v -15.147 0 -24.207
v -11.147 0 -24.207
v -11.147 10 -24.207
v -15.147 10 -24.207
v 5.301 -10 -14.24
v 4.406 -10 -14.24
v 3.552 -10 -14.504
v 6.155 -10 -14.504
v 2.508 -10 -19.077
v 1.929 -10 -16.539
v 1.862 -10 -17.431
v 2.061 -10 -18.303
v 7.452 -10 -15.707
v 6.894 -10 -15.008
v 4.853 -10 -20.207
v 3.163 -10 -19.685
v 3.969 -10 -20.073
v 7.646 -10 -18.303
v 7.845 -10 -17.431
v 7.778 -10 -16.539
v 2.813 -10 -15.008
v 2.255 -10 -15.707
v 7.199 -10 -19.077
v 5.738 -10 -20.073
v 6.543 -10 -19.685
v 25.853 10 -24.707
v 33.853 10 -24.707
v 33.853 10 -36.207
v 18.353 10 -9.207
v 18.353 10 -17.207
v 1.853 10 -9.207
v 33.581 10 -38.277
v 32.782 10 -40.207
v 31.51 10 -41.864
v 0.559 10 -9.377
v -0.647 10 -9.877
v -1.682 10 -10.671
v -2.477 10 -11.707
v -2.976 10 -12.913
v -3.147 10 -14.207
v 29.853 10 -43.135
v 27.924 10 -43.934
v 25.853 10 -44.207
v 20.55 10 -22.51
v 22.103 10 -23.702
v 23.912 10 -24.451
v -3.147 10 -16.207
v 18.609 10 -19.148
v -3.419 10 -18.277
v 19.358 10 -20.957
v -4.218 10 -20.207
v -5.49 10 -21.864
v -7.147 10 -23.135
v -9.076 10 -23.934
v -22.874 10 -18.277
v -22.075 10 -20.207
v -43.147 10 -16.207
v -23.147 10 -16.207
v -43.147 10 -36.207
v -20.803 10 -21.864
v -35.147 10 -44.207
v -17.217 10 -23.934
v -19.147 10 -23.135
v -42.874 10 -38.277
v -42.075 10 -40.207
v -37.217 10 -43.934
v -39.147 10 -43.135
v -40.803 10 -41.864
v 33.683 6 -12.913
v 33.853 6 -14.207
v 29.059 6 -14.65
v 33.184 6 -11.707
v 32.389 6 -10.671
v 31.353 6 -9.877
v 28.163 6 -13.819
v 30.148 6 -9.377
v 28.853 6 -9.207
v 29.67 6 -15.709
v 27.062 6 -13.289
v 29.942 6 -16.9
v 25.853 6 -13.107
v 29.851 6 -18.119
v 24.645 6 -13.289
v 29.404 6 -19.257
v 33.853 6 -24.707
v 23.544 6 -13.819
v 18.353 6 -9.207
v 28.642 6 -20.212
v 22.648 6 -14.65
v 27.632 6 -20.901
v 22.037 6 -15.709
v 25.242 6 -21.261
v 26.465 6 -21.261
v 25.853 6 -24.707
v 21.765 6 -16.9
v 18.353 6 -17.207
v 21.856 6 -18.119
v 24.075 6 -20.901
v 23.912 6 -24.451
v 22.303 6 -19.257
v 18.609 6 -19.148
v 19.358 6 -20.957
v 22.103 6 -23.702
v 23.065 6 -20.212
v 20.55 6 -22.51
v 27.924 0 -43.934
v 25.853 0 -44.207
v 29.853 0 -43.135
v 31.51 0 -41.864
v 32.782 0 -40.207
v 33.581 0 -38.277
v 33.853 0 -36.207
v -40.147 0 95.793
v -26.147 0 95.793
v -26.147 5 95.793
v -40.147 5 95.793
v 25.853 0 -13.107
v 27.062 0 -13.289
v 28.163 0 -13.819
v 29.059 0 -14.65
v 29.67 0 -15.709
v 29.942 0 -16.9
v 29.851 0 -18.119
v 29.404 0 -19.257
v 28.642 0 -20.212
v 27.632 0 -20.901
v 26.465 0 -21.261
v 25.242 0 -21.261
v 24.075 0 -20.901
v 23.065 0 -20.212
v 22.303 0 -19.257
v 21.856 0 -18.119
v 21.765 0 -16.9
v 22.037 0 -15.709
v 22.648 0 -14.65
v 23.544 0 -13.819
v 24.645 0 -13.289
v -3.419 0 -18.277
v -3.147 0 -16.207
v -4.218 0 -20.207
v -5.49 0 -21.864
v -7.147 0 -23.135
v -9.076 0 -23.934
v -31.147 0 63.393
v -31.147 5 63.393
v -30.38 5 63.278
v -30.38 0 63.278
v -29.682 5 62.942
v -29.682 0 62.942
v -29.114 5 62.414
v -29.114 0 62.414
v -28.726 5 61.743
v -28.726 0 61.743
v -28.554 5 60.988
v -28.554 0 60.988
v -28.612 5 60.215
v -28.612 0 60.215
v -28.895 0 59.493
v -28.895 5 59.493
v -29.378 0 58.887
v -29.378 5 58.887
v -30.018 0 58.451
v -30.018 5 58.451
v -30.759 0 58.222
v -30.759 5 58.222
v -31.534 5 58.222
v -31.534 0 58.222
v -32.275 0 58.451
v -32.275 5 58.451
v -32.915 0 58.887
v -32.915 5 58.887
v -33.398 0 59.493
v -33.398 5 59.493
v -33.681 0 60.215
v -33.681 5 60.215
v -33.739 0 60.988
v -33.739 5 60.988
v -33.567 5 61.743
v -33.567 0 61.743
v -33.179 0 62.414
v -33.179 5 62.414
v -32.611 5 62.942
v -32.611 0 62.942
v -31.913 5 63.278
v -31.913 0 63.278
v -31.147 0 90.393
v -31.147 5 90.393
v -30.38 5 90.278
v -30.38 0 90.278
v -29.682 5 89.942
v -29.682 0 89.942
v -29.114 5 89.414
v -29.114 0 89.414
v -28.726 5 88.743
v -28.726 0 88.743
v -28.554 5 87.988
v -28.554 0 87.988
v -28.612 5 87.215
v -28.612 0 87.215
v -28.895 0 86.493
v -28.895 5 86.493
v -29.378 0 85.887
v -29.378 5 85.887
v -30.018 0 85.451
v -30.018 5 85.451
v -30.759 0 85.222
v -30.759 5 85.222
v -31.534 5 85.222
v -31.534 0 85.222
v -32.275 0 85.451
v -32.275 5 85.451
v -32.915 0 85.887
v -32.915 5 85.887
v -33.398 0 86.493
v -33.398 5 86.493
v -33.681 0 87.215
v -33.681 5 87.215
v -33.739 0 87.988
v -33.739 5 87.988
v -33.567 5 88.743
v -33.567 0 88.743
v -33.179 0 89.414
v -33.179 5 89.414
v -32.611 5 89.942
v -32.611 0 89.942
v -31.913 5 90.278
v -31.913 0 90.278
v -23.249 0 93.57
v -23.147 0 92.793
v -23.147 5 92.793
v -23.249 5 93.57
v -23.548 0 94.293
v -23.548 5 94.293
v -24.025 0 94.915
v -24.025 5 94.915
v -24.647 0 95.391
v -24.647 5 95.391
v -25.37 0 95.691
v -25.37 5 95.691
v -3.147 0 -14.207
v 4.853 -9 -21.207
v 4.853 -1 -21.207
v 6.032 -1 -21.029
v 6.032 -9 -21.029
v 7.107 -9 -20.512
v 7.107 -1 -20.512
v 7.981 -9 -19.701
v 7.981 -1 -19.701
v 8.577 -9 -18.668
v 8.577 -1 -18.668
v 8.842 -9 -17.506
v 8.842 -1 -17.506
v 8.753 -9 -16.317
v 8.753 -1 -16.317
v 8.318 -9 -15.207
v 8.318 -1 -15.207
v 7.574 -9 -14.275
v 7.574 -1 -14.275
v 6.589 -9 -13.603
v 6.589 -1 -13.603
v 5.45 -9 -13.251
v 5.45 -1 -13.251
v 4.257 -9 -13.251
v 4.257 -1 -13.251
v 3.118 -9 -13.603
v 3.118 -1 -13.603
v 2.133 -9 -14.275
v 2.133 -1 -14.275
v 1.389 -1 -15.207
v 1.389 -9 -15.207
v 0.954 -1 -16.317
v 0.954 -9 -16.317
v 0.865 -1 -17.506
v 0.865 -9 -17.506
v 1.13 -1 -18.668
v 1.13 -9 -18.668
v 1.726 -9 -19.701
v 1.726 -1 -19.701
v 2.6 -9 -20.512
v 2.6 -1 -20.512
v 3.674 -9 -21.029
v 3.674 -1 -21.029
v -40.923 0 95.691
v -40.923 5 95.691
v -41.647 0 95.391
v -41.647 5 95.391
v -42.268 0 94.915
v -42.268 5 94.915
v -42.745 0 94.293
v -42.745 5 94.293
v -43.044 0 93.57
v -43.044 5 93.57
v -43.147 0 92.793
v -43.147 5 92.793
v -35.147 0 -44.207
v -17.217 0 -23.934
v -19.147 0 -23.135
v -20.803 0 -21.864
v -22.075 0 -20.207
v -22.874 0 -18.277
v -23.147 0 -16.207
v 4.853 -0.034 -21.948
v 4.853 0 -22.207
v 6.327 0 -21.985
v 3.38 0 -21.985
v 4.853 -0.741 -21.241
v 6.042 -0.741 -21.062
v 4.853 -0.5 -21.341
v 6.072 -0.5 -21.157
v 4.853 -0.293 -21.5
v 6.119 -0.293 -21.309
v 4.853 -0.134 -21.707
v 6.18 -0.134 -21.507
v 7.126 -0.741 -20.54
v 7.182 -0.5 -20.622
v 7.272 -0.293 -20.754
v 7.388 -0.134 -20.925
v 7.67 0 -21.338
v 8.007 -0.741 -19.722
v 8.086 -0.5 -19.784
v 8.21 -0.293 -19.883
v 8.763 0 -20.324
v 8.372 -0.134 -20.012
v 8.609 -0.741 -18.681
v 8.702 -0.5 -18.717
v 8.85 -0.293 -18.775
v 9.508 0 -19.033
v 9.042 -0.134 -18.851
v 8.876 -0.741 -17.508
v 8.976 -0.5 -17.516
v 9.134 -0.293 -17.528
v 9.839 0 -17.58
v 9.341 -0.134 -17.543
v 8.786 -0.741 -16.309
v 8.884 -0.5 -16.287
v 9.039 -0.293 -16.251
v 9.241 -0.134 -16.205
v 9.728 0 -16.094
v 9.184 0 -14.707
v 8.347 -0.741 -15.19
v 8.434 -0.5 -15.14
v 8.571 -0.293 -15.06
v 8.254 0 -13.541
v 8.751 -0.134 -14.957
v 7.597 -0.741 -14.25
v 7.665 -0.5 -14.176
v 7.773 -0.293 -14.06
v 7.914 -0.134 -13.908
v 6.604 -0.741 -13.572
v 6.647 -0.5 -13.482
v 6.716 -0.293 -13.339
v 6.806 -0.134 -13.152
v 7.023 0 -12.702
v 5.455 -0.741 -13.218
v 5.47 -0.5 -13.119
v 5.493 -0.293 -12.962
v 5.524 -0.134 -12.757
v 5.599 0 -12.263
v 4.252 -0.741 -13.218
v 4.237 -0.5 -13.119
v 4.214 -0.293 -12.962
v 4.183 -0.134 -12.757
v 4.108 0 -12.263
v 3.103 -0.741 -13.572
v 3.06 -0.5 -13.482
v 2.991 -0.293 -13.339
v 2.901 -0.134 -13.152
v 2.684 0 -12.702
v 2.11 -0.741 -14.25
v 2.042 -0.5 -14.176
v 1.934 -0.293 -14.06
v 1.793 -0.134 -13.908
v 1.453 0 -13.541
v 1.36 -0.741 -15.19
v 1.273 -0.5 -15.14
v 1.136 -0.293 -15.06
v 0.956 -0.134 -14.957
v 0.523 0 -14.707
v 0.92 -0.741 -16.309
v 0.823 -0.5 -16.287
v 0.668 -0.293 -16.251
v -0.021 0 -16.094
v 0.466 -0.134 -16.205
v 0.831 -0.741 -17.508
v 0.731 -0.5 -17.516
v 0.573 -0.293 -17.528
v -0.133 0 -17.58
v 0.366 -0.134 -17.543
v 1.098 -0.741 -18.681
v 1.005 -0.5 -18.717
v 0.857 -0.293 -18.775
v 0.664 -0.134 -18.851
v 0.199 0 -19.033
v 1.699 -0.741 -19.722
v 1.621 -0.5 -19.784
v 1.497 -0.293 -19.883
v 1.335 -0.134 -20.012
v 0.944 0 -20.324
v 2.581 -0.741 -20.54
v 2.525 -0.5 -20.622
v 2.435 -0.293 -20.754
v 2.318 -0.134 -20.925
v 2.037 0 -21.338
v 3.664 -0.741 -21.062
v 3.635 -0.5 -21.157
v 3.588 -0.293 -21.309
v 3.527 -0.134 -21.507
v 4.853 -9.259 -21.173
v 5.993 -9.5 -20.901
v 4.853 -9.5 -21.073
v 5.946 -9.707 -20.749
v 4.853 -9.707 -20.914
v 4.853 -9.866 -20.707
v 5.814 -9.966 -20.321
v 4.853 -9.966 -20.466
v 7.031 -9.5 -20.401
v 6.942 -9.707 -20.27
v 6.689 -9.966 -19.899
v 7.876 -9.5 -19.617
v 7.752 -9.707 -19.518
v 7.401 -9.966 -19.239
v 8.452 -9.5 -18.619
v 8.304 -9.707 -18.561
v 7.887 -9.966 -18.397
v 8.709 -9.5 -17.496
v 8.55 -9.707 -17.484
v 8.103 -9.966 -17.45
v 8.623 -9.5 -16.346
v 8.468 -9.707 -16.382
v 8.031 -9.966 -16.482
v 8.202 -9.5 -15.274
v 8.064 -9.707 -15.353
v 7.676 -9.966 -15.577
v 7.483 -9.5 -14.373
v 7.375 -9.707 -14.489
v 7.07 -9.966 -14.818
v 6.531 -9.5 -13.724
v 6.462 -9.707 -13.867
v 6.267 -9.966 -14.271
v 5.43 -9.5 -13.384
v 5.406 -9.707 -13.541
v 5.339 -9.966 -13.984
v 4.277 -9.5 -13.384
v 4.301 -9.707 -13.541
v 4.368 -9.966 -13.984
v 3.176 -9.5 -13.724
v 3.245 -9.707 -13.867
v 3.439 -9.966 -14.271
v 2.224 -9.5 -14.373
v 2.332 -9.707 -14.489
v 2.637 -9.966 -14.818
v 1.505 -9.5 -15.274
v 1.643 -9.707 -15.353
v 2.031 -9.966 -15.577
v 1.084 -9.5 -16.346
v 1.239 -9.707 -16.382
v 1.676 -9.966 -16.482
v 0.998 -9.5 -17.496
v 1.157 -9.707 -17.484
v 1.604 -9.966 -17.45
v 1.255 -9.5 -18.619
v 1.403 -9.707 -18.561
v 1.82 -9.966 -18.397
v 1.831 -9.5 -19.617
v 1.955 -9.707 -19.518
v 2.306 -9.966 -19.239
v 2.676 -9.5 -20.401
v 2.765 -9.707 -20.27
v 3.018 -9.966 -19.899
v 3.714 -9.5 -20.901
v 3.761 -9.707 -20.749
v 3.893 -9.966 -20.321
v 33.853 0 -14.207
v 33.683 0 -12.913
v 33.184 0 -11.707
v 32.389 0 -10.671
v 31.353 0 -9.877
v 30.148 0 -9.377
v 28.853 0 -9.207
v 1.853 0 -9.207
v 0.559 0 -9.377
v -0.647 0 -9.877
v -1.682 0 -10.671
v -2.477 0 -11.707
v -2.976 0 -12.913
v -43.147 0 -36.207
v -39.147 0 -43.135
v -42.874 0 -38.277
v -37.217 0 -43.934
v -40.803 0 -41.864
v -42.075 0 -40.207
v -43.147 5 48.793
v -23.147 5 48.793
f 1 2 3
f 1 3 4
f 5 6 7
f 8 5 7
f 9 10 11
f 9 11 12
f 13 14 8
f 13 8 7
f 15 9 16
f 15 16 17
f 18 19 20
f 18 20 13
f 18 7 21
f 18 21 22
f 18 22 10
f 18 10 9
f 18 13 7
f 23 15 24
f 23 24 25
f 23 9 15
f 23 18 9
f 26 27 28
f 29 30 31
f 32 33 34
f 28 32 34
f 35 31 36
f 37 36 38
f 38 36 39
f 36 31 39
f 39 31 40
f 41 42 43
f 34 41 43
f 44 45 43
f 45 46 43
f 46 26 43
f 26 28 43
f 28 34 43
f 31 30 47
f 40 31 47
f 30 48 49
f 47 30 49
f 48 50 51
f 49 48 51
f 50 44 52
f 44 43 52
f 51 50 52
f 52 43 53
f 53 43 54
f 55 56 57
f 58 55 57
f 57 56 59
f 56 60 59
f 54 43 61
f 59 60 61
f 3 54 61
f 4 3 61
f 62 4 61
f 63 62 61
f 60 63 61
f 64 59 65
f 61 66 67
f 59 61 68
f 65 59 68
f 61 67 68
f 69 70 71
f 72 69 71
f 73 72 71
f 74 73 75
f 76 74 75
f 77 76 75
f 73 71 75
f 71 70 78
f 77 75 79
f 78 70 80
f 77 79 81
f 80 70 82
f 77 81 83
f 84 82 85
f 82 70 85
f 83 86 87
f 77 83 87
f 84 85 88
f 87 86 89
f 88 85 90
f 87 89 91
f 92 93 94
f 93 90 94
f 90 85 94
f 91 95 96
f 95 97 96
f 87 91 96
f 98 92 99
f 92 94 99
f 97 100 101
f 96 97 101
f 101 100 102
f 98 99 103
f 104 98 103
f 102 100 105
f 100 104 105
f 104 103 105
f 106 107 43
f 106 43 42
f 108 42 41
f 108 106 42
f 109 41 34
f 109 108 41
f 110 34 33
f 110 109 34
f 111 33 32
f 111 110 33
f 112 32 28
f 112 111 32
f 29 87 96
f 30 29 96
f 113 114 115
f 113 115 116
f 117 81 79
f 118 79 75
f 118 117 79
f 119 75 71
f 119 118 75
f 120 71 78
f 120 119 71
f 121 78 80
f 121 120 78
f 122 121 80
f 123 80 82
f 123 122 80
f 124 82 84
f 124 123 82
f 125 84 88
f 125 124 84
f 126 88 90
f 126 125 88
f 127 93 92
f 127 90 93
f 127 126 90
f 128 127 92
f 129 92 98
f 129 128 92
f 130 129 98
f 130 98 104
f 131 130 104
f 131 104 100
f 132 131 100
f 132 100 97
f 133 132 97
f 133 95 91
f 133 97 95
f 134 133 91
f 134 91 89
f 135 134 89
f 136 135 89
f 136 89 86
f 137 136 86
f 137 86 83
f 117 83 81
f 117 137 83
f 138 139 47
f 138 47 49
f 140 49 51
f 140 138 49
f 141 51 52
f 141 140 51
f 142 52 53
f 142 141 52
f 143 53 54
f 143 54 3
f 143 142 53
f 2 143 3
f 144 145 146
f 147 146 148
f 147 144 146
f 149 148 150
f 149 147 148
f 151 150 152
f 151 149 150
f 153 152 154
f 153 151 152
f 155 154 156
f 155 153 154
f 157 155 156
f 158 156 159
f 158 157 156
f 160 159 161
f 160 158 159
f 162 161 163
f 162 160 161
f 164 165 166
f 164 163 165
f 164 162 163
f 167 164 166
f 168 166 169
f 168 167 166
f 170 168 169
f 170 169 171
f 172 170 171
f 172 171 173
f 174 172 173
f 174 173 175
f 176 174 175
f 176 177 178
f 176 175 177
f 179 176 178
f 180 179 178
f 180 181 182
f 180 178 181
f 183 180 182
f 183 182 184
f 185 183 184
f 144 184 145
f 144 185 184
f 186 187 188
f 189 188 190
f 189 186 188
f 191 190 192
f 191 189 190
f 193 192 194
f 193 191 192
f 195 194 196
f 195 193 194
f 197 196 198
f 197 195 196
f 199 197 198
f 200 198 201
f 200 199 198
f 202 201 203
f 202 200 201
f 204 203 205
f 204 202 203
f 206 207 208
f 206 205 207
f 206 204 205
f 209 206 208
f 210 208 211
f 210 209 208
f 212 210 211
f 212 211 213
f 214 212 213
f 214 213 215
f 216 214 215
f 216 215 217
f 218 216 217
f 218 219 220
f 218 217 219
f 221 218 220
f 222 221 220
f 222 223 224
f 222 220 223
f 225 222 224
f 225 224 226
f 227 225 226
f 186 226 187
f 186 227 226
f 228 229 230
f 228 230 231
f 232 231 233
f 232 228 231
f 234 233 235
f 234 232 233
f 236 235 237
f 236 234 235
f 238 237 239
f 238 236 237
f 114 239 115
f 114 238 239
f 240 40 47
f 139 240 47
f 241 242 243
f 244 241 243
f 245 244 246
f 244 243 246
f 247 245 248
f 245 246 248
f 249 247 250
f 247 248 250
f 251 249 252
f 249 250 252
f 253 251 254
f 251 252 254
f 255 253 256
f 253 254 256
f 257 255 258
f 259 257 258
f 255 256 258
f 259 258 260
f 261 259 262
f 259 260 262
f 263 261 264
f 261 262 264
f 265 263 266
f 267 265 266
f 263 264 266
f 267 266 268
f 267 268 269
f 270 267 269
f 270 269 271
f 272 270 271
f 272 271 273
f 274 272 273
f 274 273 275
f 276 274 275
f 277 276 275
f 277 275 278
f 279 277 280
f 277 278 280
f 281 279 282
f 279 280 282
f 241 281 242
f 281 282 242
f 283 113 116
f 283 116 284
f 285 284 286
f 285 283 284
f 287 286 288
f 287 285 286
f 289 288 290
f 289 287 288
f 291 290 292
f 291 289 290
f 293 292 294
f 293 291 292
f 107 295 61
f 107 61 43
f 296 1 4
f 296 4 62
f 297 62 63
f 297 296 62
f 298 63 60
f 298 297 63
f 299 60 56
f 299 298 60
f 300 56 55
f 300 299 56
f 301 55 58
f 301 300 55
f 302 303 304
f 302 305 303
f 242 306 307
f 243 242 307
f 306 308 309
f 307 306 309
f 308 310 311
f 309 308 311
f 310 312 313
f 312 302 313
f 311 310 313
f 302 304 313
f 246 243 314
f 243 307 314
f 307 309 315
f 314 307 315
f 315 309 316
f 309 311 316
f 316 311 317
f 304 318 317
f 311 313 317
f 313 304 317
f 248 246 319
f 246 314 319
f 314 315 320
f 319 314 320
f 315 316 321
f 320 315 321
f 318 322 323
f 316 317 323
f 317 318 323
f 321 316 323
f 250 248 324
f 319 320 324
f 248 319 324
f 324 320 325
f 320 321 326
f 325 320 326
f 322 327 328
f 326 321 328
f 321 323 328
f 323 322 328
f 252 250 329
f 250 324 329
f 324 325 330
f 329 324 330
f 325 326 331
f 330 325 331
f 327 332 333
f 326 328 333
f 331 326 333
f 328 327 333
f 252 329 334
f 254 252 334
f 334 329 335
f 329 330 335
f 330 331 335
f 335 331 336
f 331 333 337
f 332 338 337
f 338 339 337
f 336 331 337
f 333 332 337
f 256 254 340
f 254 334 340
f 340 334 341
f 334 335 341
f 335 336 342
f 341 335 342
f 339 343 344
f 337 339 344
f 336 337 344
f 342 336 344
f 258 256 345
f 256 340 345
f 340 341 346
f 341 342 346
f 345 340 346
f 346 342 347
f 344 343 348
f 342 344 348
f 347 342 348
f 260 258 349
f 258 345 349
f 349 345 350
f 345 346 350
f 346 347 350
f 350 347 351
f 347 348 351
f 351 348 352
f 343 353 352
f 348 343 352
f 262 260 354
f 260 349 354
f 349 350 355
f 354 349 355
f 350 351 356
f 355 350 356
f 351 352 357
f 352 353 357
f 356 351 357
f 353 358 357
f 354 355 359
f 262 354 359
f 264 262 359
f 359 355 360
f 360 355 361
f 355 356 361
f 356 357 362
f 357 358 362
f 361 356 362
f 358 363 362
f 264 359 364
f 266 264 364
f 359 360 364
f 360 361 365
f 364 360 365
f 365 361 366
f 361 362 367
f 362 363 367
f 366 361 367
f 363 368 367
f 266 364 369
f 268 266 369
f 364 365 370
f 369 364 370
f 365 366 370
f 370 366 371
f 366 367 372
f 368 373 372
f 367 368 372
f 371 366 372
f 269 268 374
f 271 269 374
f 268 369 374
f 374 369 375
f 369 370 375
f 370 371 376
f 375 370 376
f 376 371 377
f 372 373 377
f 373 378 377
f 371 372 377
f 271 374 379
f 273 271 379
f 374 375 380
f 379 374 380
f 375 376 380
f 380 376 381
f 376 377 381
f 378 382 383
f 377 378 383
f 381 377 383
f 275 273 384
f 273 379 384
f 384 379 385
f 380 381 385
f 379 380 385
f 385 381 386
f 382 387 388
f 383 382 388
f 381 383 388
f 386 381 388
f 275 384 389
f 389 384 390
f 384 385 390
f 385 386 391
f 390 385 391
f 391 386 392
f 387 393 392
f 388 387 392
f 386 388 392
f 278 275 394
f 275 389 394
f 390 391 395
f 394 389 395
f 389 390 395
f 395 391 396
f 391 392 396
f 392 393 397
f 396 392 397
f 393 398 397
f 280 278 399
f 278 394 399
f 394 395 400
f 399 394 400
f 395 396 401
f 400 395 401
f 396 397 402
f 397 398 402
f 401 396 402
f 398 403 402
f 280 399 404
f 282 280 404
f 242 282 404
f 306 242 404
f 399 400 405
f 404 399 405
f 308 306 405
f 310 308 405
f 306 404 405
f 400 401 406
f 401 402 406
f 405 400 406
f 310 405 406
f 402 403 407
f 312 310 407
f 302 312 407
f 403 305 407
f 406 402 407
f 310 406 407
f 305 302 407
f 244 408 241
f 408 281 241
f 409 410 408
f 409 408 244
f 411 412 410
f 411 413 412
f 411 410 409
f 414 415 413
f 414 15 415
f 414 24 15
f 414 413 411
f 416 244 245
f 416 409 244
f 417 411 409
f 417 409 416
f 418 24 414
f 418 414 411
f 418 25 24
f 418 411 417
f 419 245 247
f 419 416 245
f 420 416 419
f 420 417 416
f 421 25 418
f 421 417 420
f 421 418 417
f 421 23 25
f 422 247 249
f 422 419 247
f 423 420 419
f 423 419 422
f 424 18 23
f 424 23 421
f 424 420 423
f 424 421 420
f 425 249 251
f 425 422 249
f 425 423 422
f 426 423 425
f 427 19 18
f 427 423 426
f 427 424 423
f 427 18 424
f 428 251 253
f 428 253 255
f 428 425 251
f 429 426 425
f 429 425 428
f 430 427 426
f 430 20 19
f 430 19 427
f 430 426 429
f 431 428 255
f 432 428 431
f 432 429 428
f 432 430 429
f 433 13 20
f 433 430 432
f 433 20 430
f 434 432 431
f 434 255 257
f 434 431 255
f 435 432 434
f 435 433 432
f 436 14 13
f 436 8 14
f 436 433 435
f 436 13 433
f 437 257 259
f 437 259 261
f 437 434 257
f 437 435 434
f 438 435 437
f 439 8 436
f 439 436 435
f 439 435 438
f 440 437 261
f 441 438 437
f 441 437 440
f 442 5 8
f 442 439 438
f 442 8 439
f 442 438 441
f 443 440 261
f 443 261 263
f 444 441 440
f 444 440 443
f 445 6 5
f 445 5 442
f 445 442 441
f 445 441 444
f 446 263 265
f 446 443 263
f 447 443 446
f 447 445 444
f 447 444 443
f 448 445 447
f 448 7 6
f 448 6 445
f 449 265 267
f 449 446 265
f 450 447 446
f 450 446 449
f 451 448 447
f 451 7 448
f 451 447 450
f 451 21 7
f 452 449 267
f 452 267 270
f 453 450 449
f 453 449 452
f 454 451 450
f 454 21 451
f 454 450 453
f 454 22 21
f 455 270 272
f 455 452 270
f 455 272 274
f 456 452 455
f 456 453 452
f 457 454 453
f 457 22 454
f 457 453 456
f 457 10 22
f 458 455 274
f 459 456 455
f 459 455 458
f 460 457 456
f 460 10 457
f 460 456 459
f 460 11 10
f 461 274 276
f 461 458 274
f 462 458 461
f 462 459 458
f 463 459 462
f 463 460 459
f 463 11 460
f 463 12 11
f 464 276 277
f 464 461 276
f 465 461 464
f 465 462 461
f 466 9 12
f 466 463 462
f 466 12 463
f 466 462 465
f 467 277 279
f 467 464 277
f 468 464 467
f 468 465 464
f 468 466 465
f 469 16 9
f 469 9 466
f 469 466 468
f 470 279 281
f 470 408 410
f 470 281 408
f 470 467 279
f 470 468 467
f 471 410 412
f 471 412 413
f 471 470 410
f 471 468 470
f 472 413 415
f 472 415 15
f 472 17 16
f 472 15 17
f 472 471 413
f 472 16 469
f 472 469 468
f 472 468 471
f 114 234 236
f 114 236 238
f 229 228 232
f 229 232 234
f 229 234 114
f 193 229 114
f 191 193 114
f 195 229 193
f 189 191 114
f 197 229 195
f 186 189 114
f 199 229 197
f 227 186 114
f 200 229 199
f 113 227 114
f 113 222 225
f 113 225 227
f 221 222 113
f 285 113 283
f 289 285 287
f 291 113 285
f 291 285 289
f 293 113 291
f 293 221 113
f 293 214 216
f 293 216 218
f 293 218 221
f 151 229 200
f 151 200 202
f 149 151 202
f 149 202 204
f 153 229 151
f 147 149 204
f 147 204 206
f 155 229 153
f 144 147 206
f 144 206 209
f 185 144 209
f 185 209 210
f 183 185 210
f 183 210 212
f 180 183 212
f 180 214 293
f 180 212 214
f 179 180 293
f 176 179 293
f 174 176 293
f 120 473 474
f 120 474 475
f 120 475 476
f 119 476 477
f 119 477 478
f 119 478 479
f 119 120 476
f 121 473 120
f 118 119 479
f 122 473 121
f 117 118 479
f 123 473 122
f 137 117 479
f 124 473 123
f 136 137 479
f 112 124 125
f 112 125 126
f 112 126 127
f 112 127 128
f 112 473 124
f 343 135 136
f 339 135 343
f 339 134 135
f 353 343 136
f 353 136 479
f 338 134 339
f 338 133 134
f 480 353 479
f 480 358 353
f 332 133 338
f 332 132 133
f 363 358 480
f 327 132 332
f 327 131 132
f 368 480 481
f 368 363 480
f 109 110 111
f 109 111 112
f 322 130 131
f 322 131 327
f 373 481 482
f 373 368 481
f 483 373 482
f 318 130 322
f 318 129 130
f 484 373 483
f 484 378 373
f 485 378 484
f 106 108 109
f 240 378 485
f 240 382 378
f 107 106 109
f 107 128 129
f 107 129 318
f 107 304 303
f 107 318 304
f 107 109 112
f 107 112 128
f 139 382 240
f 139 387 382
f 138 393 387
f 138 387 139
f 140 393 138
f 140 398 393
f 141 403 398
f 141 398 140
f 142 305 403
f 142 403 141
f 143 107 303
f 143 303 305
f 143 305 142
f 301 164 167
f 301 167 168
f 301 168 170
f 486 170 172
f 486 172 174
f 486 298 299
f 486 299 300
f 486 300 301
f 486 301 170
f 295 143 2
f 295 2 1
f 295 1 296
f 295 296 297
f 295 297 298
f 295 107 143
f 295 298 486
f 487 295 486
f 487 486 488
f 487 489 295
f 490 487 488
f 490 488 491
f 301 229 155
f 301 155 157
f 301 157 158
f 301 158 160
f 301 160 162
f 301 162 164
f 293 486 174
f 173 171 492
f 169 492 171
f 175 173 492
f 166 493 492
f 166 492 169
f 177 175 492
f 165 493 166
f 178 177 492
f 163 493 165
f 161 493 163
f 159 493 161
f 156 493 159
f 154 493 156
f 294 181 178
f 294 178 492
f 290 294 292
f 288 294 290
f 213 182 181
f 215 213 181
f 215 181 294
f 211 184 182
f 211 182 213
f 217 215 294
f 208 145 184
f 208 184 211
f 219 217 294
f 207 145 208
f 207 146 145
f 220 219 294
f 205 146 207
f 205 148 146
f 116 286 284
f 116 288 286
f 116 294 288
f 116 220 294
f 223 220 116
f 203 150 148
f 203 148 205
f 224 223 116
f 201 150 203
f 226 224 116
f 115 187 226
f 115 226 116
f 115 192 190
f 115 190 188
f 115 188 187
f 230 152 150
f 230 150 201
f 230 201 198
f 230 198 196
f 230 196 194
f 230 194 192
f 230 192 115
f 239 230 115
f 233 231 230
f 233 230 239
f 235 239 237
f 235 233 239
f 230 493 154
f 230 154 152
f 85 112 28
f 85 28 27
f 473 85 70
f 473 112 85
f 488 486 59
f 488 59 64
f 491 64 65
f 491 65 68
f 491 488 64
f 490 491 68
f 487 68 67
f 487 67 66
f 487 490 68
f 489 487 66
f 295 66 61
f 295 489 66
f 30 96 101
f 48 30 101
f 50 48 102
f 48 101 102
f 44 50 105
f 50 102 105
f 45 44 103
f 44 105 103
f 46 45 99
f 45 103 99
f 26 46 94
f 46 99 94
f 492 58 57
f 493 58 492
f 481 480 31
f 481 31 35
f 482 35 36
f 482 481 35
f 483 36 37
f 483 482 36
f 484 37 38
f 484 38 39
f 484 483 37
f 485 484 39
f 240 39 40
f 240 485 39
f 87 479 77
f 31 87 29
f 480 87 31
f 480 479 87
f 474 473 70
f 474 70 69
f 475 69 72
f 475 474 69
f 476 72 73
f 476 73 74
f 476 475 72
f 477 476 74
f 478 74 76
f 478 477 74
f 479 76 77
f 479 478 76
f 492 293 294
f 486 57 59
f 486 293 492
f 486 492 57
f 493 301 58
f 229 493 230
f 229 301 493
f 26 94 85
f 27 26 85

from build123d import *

# Parameters (mm, degrees)
SKETCH1_R                = 4.1
SKETCH1_R_2              = 4
SKETCH1_R_3              = 2.6
BOSS_EXTRUDE1_DEPTH      = 10
CUT_EXTRUDE1_START       = -4
CUT_EXTRUDE1_DEPTH       = 4
CUT_EXTRUDE2_REACH       = 113.917
BOSS_EXTRUDE2_DEPTH      = 10
BOSS_EXTRUDE2_DEPTH_BACK = 10
SKETCH5_R                = 4
FILLET1_R                = 1


with BuildPart() as part:
    # Sketch1 → Boss-Extrude1 (new body)
    with BuildSketch(Plane(origin=(0, 0, 0), x_dir=(1, 0, 0), z_dir=(0, 1, 0))):
        with BuildLine():
            Line((28.853428594, 9.206712552), (1.853428594, 9.206712552))
            ThreePointArc((1.853428594, 9.206712552), (-1.682105312, 10.671178646), (-3.146571406, 14.206712552))
            Line((-3.146571406, 14.206712552), (-3.146571406, 16.206712552))
            ThreePointArc((-3.146571406, 16.206712552), (-5.489717157, 21.863566801), (-11.146571406, 24.206712552))
            Line((-11.146571406, 24.206712552), (-15.146571406, 24.206712552))
            ThreePointArc((-15.146571406, 24.206712552), (-20.803425656, 21.863566801), (-23.146571406, 16.206712552))
            Line((-23.146571406, 16.206712552), (-23.146571406, -92.793287448))
            ThreePointArc((-23.146571406, -92.793287448), (-24.025251062, -94.914607792), (-26.146571406, -95.793287448))
            Line((-26.146571406, -95.793287448), (-40.146571406, -95.793287448))
            ThreePointArc((-40.146571406, -95.793287448), (-42.26789175, -94.914607792), (-43.146571406, -92.793287448))
            Line((-43.146571406, -92.793287448), (-43.146571406, 4.206712552))
            Line((-43.146571406, 4.206712552), (-43.146571406, 36.206712552))
            ThreePointArc((-43.146571406, 36.206712552), (-40.803425656, 41.863566801), (-35.146571406, 44.206712552))
            Line((-35.146571406, 44.206712552), (-3.146571406, 44.206712552))
            Line((-3.146571406, 44.206712552), (25.853428594, 44.206712552))
            ThreePointArc((25.853428594, 44.206712552), (31.510282843, 41.863566801), (33.853428594, 36.206712552))
            Line((33.853428594, 36.206712552), (33.853428594, 14.206712552))
            ThreePointArc((33.853428594, 14.206712552), (32.3889625, 10.671178646), (28.853428594, 9.206712552))
        make_face()
        with Locations(Location((25.853428594, 17.206712552, 0), (0, 0, 270))):
            Circle(SKETCH1_R, mode=Mode.SUBTRACT)
        with Locations(Location((4.853428594, 17.206712552, 0), (0, 0, 270))):
            Circle(SKETCH1_R_2, mode=Mode.SUBTRACT)
        with Locations(Location((-31.146571406, -87.793287448, 0), (0, 0, 270))):
            Circle(SKETCH1_R_3, mode=Mode.SUBTRACT)
        with Locations(Location((-31.146571406, -60.793287448, 0), (0, 0, 270))):
            Circle(SKETCH1_R_3, mode=Mode.SUBTRACT)
    extrude(amount=BOSS_EXTRUDE1_DEPTH)

    # Sketch2 → Cut-Extrude1 (cut)
    with BuildSketch(Plane(origin=(0, 10, 0), x_dir=(1, 0, 0), z_dir=(0, 1, 0)).offset(CUT_EXTRUDE1_START)):
        with BuildLine():
            Line((25.853428594, 24.706712552), (33.853428594, 24.706712552))
            Line((33.853428594, 24.706712552), (33.853428594, 14.206712552))
            ThreePointArc((33.853428594, 14.206712552), (32.3889625, 10.671178646), (28.853428594, 9.206712552))
            Line((28.853428594, 9.206712552), (18.353428594, 9.206712552))
            Line((18.353428594, 9.206712552), (18.353428594, 17.206712552))
            ThreePointArc((18.353428594, 17.206712552), (20.550127735, 22.510013411), (25.853428594, 24.706712552))
        make_face()
    extrude(amount=CUT_EXTRUDE1_DEPTH, mode=Mode.SUBTRACT)

    # Cut-Extrude2: up to this face of the body (flat: up to its plane)
    cut_extrude2_end = Plane(part.part.faces().sort_by_distance((-43.146571406, 5, 28.293287448))[0])
    # Sketch3 → Cut-Extrude2 (cut, up to the picked face)
    with BuildSketch(Plane(origin=(-23.146571406, 0, 0), x_dir=(0, 0, -1), z_dir=(1, 0, 0)), mode=Mode.PRIVATE) as cut_extrude2_sk1:
        Polygon((16.206712552, 10), (-48.793287448, 5), (-99.981688139, 5), (-99.981688139, 10), align=None)
    cut_extrude2_tool1 = split(extrude(cut_extrude2_sk1.sketch, amount=-CUT_EXTRUDE2_REACH, mode=Mode.PRIVATE), bisect_by=cut_extrude2_end, keep=Keep.BOTH, mode=Mode.PRIVATE)
    add(cut_extrude2_tool1.solids().sort_by(Axis((-23.146571, 7.823621, 56.033951), (-1, 0, 0)))[0], mode=Mode.SUBTRACT)

    # Sketch5 → Boss-Extrude2 (add, two sides: drawn at the far end of the back side and taken through both)
    with BuildSketch(Plane(origin=(0, 0, 0), x_dir=(-1, 0, 0), z_dir=(0, -1, 0)).offset(-BOSS_EXTRUDE2_DEPTH_BACK)):
        with Locations(Location((-4.853428594, 17.206712552, 0), (0, 0, 90))):
            Circle(SKETCH5_R)
    extrude(amount=BOSS_EXTRUDE2_DEPTH + BOSS_EXTRUDE2_DEPTH_BACK)

    # Fillet1
    fillet1_edges = [part.edges().sort_by_distance(p)[0] for p in [
        (4.853428594, 0, -13.206712552),
        (4.853428594, -10, -13.206712552),
    ]]
    fillet(fillet1_edges, radius=FILLET1_R)


solid = part.part
